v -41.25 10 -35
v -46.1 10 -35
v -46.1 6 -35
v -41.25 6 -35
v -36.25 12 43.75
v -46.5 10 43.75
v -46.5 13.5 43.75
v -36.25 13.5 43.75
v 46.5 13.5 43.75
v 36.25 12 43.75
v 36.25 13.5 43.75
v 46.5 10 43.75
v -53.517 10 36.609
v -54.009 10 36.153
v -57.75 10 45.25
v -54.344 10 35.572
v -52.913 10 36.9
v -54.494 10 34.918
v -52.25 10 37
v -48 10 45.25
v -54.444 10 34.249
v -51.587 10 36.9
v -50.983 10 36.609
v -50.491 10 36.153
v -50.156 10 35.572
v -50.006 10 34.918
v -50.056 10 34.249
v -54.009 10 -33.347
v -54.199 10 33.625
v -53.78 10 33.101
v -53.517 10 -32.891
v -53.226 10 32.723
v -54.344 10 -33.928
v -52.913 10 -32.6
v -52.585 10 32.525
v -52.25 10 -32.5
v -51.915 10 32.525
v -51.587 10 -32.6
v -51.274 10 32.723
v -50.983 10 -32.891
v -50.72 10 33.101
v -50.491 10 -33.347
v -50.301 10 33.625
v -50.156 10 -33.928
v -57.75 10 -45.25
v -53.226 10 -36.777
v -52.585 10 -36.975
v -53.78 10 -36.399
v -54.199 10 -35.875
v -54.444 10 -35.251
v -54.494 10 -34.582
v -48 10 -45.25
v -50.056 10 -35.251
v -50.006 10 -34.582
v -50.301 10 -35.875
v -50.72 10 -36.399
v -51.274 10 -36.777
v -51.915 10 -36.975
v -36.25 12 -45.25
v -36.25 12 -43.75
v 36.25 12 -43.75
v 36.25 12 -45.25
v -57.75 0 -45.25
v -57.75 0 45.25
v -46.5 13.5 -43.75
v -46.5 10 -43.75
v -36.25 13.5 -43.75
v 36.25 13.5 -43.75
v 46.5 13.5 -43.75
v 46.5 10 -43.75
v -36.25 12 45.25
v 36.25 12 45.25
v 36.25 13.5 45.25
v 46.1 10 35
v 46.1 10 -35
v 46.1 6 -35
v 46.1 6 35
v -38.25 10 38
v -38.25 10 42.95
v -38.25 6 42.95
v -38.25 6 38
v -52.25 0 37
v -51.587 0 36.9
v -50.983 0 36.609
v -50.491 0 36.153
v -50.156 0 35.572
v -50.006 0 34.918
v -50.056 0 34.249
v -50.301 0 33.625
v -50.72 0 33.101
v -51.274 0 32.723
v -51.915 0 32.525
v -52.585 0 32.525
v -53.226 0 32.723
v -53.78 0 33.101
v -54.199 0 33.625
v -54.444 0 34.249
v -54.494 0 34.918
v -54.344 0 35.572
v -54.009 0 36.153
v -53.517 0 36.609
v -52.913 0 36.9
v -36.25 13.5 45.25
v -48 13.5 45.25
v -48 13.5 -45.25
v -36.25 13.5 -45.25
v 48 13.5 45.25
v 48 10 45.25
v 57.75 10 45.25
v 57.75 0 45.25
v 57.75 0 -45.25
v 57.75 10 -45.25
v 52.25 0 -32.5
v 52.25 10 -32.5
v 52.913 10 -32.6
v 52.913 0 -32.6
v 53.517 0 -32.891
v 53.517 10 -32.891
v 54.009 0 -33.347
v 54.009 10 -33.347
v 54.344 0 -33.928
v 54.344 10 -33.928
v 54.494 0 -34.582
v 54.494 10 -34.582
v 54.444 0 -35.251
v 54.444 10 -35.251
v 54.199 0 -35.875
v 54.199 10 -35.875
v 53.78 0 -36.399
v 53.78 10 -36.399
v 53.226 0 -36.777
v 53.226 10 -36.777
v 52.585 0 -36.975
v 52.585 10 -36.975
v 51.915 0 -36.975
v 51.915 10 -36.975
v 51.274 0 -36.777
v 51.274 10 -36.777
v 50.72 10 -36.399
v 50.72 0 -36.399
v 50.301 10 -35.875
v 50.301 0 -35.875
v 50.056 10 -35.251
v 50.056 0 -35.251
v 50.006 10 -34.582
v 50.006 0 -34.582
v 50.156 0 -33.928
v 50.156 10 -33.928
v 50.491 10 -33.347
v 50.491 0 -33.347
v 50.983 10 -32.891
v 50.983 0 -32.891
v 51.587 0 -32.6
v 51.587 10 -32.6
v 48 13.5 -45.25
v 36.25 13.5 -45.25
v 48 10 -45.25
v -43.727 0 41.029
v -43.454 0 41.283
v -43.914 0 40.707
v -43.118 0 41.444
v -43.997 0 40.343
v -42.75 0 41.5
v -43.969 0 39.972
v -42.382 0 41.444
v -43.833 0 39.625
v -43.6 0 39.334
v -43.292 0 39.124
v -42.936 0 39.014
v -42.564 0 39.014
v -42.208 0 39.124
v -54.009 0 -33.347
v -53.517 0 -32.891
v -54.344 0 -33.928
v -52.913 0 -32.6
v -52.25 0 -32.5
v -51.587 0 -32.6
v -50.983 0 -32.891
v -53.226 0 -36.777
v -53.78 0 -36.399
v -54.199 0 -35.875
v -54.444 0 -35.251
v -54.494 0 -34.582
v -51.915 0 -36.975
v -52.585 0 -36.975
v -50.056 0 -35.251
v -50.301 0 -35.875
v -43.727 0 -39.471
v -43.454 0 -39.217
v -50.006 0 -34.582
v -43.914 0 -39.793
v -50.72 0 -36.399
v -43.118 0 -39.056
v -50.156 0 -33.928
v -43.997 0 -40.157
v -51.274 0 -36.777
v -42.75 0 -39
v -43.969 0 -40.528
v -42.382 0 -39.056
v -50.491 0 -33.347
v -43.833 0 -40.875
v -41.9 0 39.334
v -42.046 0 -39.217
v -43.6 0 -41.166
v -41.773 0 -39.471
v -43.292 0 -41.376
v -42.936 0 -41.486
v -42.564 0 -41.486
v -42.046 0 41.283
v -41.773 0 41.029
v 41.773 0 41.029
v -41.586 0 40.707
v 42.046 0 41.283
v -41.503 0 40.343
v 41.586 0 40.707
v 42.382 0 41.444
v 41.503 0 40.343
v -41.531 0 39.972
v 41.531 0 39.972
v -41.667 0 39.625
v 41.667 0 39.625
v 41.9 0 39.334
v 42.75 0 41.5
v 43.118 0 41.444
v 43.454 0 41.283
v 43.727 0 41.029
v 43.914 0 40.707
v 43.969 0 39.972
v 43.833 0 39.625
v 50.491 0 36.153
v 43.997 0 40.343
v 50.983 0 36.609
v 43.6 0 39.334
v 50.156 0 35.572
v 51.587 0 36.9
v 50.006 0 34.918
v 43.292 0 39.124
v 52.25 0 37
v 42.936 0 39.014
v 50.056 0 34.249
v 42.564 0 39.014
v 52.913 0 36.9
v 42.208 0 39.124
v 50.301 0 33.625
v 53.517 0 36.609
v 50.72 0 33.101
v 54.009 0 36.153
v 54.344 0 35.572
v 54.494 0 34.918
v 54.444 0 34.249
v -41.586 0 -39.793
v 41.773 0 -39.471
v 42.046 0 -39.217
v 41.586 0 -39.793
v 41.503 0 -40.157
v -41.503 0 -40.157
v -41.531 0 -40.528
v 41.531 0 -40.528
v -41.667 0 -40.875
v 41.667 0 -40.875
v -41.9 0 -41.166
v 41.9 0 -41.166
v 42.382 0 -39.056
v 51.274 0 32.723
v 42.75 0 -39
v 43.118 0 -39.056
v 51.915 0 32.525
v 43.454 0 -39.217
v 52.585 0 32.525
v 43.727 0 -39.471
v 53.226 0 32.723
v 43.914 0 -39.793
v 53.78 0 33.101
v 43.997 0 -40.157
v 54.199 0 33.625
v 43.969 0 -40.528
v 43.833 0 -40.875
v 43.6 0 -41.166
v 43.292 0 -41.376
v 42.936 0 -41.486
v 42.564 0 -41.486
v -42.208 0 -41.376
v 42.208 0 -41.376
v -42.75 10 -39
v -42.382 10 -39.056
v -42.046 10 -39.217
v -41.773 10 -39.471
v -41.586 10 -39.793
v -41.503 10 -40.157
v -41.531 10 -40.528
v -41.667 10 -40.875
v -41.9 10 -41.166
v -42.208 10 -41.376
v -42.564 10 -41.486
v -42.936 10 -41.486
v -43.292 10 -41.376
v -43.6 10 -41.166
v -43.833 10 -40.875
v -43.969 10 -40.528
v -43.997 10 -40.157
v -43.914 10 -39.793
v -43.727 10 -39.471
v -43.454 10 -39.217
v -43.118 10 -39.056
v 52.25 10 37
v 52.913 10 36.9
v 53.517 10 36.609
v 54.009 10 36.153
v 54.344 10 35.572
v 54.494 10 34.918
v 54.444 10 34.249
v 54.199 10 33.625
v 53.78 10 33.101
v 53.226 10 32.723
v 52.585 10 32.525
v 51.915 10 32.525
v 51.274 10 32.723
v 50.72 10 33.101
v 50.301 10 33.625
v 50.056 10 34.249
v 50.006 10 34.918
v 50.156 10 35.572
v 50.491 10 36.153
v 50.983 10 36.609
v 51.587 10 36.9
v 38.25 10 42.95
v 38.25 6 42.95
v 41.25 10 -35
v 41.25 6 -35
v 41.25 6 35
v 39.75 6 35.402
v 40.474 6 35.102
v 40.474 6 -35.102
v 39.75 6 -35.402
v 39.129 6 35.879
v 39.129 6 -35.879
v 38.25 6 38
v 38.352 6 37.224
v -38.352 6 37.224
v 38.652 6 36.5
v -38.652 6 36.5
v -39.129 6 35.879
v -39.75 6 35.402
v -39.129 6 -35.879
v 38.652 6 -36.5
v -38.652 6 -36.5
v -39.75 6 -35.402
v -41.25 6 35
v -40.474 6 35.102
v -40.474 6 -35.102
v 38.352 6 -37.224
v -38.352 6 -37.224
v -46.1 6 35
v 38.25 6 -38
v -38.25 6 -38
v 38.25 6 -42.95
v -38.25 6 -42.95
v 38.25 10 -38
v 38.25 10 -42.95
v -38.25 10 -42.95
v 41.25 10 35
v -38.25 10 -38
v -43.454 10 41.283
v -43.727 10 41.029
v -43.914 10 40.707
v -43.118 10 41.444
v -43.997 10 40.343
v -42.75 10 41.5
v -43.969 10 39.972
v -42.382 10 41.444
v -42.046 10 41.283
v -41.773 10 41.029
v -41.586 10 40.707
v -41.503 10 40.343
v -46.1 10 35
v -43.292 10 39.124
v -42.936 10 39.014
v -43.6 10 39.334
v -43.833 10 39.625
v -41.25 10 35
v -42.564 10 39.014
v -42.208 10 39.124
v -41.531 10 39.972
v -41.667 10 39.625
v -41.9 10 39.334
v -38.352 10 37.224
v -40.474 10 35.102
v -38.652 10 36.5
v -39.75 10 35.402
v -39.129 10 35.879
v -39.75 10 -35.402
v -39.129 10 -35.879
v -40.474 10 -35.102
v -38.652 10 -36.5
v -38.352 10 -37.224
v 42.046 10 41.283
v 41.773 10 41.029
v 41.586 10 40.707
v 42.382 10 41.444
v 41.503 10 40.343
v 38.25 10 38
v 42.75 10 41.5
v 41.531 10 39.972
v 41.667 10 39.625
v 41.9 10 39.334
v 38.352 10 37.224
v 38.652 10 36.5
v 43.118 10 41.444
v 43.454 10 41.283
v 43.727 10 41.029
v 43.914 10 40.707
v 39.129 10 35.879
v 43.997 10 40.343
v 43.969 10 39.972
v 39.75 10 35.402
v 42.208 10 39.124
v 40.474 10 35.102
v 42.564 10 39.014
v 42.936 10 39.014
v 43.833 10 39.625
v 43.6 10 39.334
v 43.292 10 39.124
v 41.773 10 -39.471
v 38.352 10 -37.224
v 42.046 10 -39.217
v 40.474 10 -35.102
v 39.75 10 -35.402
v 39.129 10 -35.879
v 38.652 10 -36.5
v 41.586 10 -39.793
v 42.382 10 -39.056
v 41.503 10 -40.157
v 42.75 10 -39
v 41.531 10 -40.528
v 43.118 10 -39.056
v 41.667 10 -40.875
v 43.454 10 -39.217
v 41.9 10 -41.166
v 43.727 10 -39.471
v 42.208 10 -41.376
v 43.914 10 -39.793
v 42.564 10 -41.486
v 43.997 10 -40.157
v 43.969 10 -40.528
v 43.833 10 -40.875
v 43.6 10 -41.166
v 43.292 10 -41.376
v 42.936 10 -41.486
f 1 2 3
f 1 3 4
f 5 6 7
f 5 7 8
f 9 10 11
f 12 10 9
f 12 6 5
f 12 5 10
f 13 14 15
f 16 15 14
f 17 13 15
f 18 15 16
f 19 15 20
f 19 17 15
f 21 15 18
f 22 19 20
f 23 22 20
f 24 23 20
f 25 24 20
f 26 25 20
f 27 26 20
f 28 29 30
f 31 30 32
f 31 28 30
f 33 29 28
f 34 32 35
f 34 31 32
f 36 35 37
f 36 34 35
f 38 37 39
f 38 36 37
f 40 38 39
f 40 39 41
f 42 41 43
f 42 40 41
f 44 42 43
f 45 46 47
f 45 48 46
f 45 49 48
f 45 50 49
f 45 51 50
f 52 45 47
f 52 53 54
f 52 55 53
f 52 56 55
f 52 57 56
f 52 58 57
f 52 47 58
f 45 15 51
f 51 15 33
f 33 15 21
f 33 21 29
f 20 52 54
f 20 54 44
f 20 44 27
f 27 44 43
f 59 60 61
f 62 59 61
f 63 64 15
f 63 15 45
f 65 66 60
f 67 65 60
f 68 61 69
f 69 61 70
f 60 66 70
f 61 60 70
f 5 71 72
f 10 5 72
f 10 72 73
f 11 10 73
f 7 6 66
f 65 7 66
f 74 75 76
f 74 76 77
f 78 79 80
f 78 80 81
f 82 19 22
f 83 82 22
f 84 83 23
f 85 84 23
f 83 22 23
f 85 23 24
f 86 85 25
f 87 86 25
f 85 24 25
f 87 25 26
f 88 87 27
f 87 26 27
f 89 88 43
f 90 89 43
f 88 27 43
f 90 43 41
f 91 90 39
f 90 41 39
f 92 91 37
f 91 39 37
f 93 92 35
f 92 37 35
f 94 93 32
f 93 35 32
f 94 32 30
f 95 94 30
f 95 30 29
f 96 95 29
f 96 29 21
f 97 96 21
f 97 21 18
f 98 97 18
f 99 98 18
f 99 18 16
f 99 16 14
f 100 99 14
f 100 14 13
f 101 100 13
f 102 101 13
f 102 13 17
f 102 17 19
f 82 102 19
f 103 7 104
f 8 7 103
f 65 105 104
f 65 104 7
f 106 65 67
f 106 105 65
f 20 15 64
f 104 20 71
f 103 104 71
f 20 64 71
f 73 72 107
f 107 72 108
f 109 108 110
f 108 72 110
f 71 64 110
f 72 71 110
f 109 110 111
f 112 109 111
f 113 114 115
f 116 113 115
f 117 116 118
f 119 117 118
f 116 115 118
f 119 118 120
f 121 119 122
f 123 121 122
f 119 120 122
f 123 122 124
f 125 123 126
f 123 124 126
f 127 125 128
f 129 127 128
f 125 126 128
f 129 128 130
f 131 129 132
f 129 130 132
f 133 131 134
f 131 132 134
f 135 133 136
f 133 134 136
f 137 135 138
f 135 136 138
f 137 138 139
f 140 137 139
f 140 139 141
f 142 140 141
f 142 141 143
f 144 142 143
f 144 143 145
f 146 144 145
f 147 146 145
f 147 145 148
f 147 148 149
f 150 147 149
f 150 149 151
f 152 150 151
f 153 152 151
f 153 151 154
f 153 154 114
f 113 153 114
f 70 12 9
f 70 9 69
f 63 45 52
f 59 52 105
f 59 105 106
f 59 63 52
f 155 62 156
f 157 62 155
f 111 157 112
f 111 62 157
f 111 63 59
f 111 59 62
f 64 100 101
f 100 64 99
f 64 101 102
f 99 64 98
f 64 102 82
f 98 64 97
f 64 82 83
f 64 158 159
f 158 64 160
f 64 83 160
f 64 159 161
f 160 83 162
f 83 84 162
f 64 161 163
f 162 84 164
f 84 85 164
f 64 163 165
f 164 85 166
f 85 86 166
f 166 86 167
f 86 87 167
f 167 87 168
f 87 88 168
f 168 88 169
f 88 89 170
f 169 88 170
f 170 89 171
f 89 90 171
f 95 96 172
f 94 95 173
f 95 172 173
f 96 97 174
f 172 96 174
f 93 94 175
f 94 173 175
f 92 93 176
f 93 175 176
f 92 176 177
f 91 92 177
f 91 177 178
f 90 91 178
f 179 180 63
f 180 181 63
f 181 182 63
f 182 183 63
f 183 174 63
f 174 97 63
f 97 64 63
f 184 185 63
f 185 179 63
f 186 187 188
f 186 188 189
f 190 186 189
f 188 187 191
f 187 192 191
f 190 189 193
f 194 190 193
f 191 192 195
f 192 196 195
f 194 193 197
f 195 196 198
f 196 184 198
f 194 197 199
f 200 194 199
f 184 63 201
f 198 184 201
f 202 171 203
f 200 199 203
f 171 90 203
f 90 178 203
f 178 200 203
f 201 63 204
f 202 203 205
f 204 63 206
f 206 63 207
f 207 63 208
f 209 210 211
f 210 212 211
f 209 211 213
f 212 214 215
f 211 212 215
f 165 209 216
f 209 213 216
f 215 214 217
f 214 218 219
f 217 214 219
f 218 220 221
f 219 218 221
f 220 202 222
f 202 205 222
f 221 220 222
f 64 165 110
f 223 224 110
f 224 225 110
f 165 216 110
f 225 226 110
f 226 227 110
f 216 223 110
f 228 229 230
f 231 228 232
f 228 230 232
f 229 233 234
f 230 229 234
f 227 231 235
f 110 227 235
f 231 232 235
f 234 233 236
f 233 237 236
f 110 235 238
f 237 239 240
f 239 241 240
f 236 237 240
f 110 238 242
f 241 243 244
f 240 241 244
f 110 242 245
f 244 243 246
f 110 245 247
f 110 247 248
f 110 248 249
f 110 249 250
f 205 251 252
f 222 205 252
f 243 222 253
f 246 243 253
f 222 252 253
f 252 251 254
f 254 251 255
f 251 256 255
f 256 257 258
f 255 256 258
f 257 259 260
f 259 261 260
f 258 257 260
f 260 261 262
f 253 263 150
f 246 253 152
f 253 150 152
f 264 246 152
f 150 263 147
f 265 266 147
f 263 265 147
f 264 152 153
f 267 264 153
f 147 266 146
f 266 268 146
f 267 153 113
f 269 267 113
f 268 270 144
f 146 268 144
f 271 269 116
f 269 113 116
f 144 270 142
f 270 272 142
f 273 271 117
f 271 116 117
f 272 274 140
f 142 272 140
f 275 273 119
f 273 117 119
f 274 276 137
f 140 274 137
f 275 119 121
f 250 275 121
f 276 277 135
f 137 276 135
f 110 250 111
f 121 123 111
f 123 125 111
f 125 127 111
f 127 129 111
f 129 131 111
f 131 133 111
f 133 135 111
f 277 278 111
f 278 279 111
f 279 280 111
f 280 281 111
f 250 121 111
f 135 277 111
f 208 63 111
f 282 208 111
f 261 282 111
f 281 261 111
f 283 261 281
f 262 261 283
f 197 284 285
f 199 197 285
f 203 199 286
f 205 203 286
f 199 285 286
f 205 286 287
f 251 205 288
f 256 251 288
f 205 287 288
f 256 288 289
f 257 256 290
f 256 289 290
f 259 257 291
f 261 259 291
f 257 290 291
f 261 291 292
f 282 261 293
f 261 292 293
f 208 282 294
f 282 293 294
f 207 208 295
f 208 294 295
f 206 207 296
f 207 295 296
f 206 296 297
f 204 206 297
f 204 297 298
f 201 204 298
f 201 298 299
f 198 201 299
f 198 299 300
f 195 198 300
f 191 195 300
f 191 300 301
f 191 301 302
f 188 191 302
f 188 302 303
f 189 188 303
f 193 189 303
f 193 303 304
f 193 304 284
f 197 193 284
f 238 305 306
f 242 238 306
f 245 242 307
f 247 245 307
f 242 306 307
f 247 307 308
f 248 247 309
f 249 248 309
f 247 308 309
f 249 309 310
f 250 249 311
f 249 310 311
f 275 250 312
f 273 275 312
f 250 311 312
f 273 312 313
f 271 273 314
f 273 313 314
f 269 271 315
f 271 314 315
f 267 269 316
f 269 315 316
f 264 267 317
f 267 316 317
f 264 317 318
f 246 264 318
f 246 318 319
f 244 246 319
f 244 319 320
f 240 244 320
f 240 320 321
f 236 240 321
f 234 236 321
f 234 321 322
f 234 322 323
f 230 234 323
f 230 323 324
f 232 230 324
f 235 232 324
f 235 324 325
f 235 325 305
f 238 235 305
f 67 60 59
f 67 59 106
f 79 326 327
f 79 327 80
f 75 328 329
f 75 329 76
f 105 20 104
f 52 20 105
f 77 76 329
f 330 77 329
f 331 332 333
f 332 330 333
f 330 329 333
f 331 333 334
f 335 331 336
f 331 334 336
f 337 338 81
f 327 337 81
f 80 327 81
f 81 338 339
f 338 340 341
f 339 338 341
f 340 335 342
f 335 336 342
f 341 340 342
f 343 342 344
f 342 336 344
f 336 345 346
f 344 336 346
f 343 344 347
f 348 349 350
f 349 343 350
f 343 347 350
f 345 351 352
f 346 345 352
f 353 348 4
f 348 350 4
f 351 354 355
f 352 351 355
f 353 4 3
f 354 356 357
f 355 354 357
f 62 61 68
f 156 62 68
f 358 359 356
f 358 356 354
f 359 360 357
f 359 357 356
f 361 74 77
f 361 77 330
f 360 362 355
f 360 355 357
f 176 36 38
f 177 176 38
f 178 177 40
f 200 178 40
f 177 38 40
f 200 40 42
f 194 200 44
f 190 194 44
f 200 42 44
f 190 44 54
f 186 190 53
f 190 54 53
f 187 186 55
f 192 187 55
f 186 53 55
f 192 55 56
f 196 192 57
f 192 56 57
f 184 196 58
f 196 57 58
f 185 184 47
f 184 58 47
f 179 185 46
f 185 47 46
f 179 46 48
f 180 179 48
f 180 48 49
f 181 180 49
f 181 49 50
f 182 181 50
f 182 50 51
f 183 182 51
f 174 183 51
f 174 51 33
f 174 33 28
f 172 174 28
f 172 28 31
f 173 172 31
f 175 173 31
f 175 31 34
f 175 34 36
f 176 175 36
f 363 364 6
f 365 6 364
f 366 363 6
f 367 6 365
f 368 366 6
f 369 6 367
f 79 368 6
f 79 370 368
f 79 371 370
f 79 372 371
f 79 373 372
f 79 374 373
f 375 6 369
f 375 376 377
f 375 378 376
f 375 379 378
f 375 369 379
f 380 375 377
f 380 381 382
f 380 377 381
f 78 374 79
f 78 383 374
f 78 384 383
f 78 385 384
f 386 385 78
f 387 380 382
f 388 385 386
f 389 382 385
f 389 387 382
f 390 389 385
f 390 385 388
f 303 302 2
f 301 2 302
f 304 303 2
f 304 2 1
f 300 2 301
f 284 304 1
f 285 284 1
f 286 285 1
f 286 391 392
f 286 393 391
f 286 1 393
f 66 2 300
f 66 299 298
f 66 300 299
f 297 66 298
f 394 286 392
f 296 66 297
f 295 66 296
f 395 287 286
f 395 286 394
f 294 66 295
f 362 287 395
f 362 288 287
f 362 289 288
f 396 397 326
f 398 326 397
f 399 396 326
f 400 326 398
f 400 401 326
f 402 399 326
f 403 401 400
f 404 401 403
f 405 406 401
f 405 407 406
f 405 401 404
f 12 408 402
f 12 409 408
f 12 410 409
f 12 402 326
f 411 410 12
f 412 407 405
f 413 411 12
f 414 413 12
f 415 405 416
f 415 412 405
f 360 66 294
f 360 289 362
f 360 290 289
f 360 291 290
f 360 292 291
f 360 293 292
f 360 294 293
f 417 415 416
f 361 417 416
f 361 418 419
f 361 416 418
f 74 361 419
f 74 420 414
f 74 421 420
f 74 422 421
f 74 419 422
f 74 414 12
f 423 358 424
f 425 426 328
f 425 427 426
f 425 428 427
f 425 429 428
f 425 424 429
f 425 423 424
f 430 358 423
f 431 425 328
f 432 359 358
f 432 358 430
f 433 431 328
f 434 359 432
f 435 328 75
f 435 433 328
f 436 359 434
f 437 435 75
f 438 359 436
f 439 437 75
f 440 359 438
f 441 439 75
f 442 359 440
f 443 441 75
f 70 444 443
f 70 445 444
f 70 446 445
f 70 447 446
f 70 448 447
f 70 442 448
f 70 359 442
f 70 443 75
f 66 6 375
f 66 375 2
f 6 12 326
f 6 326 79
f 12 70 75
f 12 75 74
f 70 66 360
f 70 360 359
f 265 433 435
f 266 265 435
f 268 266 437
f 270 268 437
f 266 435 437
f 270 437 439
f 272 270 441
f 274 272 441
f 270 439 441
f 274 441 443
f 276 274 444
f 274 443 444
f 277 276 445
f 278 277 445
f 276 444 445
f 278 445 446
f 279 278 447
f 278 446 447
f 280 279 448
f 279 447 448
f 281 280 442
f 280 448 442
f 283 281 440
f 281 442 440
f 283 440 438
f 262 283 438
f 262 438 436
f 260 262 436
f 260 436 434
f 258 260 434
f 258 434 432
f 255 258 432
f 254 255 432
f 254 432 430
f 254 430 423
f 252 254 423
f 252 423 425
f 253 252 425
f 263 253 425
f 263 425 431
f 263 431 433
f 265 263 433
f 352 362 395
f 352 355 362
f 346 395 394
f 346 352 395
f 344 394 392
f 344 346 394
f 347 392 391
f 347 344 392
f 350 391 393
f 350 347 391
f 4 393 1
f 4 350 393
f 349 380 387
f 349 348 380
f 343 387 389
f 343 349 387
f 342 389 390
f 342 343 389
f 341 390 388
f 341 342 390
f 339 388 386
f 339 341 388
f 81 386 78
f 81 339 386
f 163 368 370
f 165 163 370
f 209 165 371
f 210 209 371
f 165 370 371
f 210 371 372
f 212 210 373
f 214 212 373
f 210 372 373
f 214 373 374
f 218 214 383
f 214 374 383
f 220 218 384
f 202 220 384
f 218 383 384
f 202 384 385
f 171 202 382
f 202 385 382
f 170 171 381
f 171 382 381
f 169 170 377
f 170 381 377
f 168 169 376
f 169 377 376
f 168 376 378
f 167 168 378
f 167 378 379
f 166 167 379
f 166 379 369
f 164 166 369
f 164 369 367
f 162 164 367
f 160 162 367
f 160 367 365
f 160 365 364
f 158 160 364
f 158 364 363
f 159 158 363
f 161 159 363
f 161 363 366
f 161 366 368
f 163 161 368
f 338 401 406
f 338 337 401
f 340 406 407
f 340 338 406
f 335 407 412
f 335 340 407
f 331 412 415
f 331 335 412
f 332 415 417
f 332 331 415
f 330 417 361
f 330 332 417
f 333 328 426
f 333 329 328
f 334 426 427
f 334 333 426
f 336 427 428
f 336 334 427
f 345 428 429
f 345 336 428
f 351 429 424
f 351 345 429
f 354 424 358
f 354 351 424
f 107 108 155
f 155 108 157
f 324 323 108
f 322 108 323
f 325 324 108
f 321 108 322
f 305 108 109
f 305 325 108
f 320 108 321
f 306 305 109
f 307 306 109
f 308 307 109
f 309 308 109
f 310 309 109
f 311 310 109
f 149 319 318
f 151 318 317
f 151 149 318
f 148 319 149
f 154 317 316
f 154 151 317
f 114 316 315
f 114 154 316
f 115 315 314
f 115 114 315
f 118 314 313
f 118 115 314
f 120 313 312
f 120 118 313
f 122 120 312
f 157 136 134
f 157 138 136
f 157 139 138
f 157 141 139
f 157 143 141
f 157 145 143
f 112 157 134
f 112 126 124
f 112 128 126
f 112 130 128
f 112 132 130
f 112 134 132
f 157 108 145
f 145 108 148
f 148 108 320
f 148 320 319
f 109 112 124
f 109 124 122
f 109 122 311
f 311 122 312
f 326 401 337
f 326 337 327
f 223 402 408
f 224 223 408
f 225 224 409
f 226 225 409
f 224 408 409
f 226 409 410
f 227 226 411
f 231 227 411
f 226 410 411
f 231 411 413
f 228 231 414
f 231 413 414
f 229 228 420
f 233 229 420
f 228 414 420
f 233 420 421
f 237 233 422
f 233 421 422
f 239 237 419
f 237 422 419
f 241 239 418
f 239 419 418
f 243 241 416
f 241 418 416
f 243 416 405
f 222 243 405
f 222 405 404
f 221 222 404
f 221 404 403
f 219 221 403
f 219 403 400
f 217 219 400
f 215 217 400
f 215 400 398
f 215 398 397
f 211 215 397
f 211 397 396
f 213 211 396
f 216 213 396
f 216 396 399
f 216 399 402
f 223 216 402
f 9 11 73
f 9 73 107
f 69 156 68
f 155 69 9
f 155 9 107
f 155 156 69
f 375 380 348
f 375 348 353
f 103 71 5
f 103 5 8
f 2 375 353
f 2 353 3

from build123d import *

# Parameters (mm, degrees)
SKETCH1_W           = 115.5
SKETCH1_H           = 90.5
BOSS_EXTRUDE1_DEPTH = 10
SKETCH2_W           = 96
SKETCH2_H           = 90.5
SKETCH2_W_2         = 93
SKETCH2_H_2         = 87.5
BOSS_EXTRUDE2_DEPTH = 3.5
SKETCH3_R           = 1.25
CUT_EXTRUDE1_DEPTH  = 20
CUT_EXTRUDE2_DEPTH  = 4
FILLET1_R           = 3
SKETCH5_R           = 2.25
CUT_EXTRUDE3_DEPTH  = 15
SKETCH6_W           = 72.5
SKETCH6_H           = 10.501850212
CUT_EXTRUDE4_DEPTH  = 98


with BuildPart() as part:
    # Sketch1 → Boss-Extrude1 (new body)
    with BuildSketch(Plane(origin=(0, 0, 0), x_dir=(1, 0, 0), z_dir=(0, 1, 0))):
        Rectangle(SKETCH1_W, SKETCH1_H)
    extrude(amount=BOSS_EXTRUDE1_DEPTH)

    # Sketch2 → Boss-Extrude2 (add)
    with BuildSketch(Plane(origin=(0, 10, 0), x_dir=(1, 0, 0), z_dir=(0, 1, 0))):
        Rectangle(SKETCH2_W, SKETCH2_H)
        Rectangle(SKETCH2_W_2, SKETCH2_H_2, mode=Mode.SUBTRACT)
    extrude(amount=BOSS_EXTRUDE2_DEPTH)

    # Sketch3 → Cut-Extrude1 (cut)
    with BuildSketch(Plane(origin=(0, 10, 0), x_dir=(1, 0, 0), z_dir=(0, 1, 0))):
        with Locations(Location((-42.75, 40.25, 0), (0, 0, 270))):
            Circle(SKETCH3_R)
        with Locations(Location((42.75, 40.25, 0), (0, 0, 270))):
            Circle(SKETCH3_R)
        with Locations(Location((42.75, -40.25, 0), (0, 0, 270))):
            Circle(SKETCH3_R)
        with Locations(Location((-42.75, -40.25, 0), (0, 0, 270))):
            Circle(SKETCH3_R)
    extrude(amount=-CUT_EXTRUDE1_DEPTH, mode=Mode.SUBTRACT)

    # Sketch4 → Cut-Extrude2 (cut)
    with BuildSketch(Plane(origin=(0, 10, 0), x_dir=(1, 0, 0), z_dir=(0, 1, 0))):
        Polygon((-38.25, 42.95), (38.25, 42.95), (38.25, 35), (46.1, 35), (46.1, -35), (38.25, -35), (38.25, -42.95), (-38.25, -42.95), (-38.25, -35), (-46.1, -35), (-46.1, 35), (-38.25, 35), align=None)
    extrude(amount=-CUT_EXTRUDE2_DEPTH, mode=Mode.SUBTRACT)

    # Fillet1
    fillet1_edges = [part.edges().sort_by_distance(p)[0] for p in [
        (-38.25, 8, -35),
        (38.25, 8, -35),
        (38.25, 8, 35),
        (-38.25, 8, 35),
    ]]
    fillet(fillet1_edges, radius=FILLET1_R)

    # Sketch5 → Cut-Extrude3 (cut)
    with BuildSketch(Plane(origin=(0, 10, 0), x_dir=(1, 0, 0), z_dir=(0, 1, 0))):
        with Locations(Location((-52.25, 34.75, 0), (0, 0, 270))):
            Circle(SKETCH5_R)
        with Locations(Location((52.25, 34.75, 0), (0, 0, 270))):
            Circle(SKETCH5_R)
        with Locations(Location((52.25, -34.75, 0), (0, 0, 270))):
            Circle(SKETCH5_R)
        with Locations(Location((-52.25, -34.75, 0), (0, 0, 270))):
            Circle(SKETCH5_R)
    extrude(amount=-CUT_EXTRUDE3_DEPTH, mode=Mode.SUBTRACT)

    # Sketch6 → Cut-Extrude4 (cut)
    with BuildSketch(Plane.XY.offset(45.25)):
        with Locations((0, 17.250925106)):
            Rectangle(SKETCH6_W, SKETCH6_H)
    extrude(amount=-CUT_EXTRUDE4_DEPTH, mode=Mode.SUBTRACT)


solid = part.part
